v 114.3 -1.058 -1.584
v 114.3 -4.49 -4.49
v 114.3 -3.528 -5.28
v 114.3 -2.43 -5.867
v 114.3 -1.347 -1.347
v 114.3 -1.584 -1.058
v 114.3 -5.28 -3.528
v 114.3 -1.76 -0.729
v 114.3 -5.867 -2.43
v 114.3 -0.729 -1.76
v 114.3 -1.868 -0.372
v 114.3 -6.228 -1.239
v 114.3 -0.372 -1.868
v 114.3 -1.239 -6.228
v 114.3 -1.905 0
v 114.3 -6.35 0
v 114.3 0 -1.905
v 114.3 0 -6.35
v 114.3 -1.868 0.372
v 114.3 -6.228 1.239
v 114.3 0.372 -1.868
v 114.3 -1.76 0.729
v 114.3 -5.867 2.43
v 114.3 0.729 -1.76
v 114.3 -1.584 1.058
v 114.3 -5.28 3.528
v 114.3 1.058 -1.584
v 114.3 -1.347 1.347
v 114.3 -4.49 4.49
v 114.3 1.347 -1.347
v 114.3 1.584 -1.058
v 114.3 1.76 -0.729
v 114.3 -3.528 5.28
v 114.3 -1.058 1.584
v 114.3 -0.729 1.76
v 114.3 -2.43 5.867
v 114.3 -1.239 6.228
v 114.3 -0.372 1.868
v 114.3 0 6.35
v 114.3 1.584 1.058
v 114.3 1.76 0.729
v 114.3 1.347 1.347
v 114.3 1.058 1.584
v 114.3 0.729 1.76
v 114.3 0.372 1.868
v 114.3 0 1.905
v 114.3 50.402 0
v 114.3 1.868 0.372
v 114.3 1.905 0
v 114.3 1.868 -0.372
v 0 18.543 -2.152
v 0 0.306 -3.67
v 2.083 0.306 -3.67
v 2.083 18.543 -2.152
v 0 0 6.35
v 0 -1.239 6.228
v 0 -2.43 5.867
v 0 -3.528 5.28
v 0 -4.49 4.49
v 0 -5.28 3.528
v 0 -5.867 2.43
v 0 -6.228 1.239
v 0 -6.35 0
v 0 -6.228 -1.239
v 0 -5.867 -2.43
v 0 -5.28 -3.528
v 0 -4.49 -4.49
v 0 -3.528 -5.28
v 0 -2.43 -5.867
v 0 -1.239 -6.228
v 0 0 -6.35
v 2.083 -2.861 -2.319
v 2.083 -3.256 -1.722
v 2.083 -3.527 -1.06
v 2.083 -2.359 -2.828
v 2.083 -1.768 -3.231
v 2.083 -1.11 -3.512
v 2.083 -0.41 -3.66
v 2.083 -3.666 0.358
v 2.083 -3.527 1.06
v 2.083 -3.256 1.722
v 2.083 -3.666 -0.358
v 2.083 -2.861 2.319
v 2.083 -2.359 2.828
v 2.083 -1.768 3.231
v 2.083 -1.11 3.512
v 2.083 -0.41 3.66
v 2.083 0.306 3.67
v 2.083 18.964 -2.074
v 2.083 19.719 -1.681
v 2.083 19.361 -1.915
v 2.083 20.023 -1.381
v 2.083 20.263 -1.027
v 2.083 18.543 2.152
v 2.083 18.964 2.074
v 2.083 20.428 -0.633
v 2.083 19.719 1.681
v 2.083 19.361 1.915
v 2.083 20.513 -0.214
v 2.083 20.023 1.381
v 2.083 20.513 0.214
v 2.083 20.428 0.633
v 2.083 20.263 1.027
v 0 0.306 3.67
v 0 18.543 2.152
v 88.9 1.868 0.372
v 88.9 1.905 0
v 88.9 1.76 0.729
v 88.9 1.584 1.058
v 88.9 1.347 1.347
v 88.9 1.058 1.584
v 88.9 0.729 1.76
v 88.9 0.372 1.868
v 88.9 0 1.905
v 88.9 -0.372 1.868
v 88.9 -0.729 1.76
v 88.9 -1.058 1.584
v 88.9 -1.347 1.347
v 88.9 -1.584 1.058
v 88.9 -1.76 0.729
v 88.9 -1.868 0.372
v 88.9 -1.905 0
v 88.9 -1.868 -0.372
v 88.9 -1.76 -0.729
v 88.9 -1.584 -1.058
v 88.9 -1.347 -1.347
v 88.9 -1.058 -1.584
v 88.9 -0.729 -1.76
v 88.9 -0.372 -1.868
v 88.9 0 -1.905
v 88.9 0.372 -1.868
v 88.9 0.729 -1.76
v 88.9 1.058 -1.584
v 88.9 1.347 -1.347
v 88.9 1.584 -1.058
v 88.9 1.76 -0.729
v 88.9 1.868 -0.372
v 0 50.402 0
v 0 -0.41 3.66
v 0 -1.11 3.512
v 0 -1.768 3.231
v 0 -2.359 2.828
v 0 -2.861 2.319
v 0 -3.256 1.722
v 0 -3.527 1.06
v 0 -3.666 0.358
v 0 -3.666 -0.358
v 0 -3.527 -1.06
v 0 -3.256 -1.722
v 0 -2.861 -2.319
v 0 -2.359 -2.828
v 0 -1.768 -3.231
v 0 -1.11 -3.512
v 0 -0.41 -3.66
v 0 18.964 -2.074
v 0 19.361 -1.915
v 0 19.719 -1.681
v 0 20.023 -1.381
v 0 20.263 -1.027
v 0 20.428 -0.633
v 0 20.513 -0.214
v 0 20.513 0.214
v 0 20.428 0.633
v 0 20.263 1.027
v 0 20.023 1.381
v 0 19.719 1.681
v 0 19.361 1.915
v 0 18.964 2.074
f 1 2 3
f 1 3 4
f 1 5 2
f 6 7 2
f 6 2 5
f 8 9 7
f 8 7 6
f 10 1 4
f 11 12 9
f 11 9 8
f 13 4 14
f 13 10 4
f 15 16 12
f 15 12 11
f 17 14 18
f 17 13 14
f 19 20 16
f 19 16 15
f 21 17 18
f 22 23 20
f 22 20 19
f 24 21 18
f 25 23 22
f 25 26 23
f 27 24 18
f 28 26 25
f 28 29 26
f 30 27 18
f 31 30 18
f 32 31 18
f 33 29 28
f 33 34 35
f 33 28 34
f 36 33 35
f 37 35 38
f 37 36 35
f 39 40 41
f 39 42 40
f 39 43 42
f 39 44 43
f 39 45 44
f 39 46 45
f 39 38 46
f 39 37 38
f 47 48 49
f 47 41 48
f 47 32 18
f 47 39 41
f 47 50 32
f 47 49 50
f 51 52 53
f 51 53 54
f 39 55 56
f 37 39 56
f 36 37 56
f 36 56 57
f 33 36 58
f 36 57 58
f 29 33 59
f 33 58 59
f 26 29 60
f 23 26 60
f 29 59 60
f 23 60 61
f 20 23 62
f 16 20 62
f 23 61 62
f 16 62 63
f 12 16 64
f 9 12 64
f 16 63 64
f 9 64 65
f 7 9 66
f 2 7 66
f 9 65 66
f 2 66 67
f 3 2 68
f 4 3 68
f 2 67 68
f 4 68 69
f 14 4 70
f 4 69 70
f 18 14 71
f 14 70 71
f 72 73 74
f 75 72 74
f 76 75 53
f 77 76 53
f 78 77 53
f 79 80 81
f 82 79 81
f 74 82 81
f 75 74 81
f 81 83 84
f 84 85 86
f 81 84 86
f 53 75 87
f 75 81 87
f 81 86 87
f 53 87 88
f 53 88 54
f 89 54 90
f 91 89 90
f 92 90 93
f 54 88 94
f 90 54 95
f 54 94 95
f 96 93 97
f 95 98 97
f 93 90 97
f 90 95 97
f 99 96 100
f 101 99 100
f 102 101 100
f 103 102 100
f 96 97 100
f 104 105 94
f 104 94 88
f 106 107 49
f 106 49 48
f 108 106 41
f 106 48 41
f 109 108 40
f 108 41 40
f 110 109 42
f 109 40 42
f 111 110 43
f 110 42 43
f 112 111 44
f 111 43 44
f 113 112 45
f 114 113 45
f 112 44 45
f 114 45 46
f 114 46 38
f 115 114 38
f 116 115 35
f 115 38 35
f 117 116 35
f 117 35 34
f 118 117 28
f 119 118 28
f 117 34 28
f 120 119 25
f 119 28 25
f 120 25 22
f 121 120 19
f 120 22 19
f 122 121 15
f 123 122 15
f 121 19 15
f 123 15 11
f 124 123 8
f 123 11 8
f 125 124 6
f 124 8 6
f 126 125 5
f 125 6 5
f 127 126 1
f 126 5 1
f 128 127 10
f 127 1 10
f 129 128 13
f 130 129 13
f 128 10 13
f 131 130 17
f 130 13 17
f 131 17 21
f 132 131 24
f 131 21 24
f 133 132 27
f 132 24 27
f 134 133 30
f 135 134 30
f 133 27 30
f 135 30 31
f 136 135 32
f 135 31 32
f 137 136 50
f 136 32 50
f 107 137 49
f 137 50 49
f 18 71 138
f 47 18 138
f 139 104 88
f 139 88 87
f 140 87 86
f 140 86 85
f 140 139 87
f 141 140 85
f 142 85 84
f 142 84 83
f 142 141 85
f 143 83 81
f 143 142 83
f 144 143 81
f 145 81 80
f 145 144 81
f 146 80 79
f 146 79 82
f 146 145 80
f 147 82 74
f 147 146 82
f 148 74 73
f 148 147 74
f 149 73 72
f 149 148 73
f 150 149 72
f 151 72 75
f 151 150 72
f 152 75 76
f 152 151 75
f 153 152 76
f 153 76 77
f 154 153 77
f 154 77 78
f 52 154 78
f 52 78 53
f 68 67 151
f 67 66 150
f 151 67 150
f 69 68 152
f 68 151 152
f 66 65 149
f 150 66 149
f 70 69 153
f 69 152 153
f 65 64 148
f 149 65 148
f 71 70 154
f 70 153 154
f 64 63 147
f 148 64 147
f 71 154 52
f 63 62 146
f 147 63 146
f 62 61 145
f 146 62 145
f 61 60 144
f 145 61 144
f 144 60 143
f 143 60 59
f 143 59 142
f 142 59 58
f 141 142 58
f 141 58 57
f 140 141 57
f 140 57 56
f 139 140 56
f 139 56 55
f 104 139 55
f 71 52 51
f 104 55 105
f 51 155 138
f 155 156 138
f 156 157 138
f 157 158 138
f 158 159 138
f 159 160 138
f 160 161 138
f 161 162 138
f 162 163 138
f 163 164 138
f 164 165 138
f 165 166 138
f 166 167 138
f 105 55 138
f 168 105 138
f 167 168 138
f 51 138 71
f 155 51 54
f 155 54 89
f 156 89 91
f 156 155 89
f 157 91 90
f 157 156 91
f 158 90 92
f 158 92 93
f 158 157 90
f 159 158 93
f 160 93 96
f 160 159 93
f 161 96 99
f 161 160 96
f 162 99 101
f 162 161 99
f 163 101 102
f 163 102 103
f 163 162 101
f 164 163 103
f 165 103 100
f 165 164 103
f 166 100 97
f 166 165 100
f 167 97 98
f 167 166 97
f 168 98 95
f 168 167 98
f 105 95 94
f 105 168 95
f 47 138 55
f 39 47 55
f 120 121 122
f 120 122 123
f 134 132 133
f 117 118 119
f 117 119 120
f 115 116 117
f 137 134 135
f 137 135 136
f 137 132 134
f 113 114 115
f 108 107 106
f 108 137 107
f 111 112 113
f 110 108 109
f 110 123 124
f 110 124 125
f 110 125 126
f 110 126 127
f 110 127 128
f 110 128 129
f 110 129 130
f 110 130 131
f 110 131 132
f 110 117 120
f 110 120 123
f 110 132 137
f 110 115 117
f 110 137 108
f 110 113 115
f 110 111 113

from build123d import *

# Parameters (mm, degrees)
F0_R     = 2.8575
F1_DEPTH = 114.3
F2_DEPTH = 2.0828
F3_R     = 1.905
F4_DEPTH = 25.4


with BuildPart() as f1:
    # F0 (on Right) → F1 (new body)
    with BuildSketch(Plane.YZ):
        with BuildLine():
            Line((50.401562, 0), (0, 6.35))
            ThreePointArc((0, 6.35), (-6.35, 0), (0, -6.35))
            Line((0, -6.35), (50.401562, 0))
        make_face()
        with BuildLine():
            ThreePointArc((0.305643, -3.670296), (-3.683, 0), (0.305643, 3.670296))
            Line((0.305643, 3.670296), (18.54337, 2.151553))
            ThreePointArc((18.54337, 2.151553), (20.5232, 0), (18.54337, -2.151553))
            Line((18.54337, -2.151553), (0.305643, -3.670296))
        make_face(mode=Mode.SUBTRACT)
        with BuildLine():
            Line((18.54337, 2.151553), (0.305643, 3.670296))
            ThreePointArc((0.305643, 3.670296), (-3.683, 0), (0.305643, -3.670296))
            Line((0.305643, -3.670296), (18.54337, -2.151553))
            ThreePointArc((18.54337, -2.151553), (20.5232, 0), (18.54337, 2.151553))
        make_face()
        Circle(F0_R, mode=Mode.SUBTRACT)
        Circle(F0_R)
    extrude(amount=F1_DEPTH)

    # F0 (on Right) → F2 (cut)
    with BuildSketch(Plane.YZ):
        with BuildLine():
            Line((18.54337, 2.151553), (0.305643, 3.670296))
            ThreePointArc((0.305643, 3.670296), (-3.683, 0), (0.305643, -3.670296))
            Line((0.305643, -3.670296), (18.54337, -2.151553))
            ThreePointArc((18.54337, -2.151553), (20.5232, 0), (18.54337, 2.151553))
        make_face()
        Circle(F0_R, mode=Mode.SUBTRACT)
        Circle(F0_R)
    extrude(amount=F2_DEPTH, mode=Mode.SUBTRACT)

    # F3 (on face) → F4 (cut)
    with BuildSketch(Plane.YZ.offset(114.3)):
        Circle(F3_R)
    extrude(amount=-F4_DEPTH, mode=Mode.SUBTRACT)


solid = f1.part
